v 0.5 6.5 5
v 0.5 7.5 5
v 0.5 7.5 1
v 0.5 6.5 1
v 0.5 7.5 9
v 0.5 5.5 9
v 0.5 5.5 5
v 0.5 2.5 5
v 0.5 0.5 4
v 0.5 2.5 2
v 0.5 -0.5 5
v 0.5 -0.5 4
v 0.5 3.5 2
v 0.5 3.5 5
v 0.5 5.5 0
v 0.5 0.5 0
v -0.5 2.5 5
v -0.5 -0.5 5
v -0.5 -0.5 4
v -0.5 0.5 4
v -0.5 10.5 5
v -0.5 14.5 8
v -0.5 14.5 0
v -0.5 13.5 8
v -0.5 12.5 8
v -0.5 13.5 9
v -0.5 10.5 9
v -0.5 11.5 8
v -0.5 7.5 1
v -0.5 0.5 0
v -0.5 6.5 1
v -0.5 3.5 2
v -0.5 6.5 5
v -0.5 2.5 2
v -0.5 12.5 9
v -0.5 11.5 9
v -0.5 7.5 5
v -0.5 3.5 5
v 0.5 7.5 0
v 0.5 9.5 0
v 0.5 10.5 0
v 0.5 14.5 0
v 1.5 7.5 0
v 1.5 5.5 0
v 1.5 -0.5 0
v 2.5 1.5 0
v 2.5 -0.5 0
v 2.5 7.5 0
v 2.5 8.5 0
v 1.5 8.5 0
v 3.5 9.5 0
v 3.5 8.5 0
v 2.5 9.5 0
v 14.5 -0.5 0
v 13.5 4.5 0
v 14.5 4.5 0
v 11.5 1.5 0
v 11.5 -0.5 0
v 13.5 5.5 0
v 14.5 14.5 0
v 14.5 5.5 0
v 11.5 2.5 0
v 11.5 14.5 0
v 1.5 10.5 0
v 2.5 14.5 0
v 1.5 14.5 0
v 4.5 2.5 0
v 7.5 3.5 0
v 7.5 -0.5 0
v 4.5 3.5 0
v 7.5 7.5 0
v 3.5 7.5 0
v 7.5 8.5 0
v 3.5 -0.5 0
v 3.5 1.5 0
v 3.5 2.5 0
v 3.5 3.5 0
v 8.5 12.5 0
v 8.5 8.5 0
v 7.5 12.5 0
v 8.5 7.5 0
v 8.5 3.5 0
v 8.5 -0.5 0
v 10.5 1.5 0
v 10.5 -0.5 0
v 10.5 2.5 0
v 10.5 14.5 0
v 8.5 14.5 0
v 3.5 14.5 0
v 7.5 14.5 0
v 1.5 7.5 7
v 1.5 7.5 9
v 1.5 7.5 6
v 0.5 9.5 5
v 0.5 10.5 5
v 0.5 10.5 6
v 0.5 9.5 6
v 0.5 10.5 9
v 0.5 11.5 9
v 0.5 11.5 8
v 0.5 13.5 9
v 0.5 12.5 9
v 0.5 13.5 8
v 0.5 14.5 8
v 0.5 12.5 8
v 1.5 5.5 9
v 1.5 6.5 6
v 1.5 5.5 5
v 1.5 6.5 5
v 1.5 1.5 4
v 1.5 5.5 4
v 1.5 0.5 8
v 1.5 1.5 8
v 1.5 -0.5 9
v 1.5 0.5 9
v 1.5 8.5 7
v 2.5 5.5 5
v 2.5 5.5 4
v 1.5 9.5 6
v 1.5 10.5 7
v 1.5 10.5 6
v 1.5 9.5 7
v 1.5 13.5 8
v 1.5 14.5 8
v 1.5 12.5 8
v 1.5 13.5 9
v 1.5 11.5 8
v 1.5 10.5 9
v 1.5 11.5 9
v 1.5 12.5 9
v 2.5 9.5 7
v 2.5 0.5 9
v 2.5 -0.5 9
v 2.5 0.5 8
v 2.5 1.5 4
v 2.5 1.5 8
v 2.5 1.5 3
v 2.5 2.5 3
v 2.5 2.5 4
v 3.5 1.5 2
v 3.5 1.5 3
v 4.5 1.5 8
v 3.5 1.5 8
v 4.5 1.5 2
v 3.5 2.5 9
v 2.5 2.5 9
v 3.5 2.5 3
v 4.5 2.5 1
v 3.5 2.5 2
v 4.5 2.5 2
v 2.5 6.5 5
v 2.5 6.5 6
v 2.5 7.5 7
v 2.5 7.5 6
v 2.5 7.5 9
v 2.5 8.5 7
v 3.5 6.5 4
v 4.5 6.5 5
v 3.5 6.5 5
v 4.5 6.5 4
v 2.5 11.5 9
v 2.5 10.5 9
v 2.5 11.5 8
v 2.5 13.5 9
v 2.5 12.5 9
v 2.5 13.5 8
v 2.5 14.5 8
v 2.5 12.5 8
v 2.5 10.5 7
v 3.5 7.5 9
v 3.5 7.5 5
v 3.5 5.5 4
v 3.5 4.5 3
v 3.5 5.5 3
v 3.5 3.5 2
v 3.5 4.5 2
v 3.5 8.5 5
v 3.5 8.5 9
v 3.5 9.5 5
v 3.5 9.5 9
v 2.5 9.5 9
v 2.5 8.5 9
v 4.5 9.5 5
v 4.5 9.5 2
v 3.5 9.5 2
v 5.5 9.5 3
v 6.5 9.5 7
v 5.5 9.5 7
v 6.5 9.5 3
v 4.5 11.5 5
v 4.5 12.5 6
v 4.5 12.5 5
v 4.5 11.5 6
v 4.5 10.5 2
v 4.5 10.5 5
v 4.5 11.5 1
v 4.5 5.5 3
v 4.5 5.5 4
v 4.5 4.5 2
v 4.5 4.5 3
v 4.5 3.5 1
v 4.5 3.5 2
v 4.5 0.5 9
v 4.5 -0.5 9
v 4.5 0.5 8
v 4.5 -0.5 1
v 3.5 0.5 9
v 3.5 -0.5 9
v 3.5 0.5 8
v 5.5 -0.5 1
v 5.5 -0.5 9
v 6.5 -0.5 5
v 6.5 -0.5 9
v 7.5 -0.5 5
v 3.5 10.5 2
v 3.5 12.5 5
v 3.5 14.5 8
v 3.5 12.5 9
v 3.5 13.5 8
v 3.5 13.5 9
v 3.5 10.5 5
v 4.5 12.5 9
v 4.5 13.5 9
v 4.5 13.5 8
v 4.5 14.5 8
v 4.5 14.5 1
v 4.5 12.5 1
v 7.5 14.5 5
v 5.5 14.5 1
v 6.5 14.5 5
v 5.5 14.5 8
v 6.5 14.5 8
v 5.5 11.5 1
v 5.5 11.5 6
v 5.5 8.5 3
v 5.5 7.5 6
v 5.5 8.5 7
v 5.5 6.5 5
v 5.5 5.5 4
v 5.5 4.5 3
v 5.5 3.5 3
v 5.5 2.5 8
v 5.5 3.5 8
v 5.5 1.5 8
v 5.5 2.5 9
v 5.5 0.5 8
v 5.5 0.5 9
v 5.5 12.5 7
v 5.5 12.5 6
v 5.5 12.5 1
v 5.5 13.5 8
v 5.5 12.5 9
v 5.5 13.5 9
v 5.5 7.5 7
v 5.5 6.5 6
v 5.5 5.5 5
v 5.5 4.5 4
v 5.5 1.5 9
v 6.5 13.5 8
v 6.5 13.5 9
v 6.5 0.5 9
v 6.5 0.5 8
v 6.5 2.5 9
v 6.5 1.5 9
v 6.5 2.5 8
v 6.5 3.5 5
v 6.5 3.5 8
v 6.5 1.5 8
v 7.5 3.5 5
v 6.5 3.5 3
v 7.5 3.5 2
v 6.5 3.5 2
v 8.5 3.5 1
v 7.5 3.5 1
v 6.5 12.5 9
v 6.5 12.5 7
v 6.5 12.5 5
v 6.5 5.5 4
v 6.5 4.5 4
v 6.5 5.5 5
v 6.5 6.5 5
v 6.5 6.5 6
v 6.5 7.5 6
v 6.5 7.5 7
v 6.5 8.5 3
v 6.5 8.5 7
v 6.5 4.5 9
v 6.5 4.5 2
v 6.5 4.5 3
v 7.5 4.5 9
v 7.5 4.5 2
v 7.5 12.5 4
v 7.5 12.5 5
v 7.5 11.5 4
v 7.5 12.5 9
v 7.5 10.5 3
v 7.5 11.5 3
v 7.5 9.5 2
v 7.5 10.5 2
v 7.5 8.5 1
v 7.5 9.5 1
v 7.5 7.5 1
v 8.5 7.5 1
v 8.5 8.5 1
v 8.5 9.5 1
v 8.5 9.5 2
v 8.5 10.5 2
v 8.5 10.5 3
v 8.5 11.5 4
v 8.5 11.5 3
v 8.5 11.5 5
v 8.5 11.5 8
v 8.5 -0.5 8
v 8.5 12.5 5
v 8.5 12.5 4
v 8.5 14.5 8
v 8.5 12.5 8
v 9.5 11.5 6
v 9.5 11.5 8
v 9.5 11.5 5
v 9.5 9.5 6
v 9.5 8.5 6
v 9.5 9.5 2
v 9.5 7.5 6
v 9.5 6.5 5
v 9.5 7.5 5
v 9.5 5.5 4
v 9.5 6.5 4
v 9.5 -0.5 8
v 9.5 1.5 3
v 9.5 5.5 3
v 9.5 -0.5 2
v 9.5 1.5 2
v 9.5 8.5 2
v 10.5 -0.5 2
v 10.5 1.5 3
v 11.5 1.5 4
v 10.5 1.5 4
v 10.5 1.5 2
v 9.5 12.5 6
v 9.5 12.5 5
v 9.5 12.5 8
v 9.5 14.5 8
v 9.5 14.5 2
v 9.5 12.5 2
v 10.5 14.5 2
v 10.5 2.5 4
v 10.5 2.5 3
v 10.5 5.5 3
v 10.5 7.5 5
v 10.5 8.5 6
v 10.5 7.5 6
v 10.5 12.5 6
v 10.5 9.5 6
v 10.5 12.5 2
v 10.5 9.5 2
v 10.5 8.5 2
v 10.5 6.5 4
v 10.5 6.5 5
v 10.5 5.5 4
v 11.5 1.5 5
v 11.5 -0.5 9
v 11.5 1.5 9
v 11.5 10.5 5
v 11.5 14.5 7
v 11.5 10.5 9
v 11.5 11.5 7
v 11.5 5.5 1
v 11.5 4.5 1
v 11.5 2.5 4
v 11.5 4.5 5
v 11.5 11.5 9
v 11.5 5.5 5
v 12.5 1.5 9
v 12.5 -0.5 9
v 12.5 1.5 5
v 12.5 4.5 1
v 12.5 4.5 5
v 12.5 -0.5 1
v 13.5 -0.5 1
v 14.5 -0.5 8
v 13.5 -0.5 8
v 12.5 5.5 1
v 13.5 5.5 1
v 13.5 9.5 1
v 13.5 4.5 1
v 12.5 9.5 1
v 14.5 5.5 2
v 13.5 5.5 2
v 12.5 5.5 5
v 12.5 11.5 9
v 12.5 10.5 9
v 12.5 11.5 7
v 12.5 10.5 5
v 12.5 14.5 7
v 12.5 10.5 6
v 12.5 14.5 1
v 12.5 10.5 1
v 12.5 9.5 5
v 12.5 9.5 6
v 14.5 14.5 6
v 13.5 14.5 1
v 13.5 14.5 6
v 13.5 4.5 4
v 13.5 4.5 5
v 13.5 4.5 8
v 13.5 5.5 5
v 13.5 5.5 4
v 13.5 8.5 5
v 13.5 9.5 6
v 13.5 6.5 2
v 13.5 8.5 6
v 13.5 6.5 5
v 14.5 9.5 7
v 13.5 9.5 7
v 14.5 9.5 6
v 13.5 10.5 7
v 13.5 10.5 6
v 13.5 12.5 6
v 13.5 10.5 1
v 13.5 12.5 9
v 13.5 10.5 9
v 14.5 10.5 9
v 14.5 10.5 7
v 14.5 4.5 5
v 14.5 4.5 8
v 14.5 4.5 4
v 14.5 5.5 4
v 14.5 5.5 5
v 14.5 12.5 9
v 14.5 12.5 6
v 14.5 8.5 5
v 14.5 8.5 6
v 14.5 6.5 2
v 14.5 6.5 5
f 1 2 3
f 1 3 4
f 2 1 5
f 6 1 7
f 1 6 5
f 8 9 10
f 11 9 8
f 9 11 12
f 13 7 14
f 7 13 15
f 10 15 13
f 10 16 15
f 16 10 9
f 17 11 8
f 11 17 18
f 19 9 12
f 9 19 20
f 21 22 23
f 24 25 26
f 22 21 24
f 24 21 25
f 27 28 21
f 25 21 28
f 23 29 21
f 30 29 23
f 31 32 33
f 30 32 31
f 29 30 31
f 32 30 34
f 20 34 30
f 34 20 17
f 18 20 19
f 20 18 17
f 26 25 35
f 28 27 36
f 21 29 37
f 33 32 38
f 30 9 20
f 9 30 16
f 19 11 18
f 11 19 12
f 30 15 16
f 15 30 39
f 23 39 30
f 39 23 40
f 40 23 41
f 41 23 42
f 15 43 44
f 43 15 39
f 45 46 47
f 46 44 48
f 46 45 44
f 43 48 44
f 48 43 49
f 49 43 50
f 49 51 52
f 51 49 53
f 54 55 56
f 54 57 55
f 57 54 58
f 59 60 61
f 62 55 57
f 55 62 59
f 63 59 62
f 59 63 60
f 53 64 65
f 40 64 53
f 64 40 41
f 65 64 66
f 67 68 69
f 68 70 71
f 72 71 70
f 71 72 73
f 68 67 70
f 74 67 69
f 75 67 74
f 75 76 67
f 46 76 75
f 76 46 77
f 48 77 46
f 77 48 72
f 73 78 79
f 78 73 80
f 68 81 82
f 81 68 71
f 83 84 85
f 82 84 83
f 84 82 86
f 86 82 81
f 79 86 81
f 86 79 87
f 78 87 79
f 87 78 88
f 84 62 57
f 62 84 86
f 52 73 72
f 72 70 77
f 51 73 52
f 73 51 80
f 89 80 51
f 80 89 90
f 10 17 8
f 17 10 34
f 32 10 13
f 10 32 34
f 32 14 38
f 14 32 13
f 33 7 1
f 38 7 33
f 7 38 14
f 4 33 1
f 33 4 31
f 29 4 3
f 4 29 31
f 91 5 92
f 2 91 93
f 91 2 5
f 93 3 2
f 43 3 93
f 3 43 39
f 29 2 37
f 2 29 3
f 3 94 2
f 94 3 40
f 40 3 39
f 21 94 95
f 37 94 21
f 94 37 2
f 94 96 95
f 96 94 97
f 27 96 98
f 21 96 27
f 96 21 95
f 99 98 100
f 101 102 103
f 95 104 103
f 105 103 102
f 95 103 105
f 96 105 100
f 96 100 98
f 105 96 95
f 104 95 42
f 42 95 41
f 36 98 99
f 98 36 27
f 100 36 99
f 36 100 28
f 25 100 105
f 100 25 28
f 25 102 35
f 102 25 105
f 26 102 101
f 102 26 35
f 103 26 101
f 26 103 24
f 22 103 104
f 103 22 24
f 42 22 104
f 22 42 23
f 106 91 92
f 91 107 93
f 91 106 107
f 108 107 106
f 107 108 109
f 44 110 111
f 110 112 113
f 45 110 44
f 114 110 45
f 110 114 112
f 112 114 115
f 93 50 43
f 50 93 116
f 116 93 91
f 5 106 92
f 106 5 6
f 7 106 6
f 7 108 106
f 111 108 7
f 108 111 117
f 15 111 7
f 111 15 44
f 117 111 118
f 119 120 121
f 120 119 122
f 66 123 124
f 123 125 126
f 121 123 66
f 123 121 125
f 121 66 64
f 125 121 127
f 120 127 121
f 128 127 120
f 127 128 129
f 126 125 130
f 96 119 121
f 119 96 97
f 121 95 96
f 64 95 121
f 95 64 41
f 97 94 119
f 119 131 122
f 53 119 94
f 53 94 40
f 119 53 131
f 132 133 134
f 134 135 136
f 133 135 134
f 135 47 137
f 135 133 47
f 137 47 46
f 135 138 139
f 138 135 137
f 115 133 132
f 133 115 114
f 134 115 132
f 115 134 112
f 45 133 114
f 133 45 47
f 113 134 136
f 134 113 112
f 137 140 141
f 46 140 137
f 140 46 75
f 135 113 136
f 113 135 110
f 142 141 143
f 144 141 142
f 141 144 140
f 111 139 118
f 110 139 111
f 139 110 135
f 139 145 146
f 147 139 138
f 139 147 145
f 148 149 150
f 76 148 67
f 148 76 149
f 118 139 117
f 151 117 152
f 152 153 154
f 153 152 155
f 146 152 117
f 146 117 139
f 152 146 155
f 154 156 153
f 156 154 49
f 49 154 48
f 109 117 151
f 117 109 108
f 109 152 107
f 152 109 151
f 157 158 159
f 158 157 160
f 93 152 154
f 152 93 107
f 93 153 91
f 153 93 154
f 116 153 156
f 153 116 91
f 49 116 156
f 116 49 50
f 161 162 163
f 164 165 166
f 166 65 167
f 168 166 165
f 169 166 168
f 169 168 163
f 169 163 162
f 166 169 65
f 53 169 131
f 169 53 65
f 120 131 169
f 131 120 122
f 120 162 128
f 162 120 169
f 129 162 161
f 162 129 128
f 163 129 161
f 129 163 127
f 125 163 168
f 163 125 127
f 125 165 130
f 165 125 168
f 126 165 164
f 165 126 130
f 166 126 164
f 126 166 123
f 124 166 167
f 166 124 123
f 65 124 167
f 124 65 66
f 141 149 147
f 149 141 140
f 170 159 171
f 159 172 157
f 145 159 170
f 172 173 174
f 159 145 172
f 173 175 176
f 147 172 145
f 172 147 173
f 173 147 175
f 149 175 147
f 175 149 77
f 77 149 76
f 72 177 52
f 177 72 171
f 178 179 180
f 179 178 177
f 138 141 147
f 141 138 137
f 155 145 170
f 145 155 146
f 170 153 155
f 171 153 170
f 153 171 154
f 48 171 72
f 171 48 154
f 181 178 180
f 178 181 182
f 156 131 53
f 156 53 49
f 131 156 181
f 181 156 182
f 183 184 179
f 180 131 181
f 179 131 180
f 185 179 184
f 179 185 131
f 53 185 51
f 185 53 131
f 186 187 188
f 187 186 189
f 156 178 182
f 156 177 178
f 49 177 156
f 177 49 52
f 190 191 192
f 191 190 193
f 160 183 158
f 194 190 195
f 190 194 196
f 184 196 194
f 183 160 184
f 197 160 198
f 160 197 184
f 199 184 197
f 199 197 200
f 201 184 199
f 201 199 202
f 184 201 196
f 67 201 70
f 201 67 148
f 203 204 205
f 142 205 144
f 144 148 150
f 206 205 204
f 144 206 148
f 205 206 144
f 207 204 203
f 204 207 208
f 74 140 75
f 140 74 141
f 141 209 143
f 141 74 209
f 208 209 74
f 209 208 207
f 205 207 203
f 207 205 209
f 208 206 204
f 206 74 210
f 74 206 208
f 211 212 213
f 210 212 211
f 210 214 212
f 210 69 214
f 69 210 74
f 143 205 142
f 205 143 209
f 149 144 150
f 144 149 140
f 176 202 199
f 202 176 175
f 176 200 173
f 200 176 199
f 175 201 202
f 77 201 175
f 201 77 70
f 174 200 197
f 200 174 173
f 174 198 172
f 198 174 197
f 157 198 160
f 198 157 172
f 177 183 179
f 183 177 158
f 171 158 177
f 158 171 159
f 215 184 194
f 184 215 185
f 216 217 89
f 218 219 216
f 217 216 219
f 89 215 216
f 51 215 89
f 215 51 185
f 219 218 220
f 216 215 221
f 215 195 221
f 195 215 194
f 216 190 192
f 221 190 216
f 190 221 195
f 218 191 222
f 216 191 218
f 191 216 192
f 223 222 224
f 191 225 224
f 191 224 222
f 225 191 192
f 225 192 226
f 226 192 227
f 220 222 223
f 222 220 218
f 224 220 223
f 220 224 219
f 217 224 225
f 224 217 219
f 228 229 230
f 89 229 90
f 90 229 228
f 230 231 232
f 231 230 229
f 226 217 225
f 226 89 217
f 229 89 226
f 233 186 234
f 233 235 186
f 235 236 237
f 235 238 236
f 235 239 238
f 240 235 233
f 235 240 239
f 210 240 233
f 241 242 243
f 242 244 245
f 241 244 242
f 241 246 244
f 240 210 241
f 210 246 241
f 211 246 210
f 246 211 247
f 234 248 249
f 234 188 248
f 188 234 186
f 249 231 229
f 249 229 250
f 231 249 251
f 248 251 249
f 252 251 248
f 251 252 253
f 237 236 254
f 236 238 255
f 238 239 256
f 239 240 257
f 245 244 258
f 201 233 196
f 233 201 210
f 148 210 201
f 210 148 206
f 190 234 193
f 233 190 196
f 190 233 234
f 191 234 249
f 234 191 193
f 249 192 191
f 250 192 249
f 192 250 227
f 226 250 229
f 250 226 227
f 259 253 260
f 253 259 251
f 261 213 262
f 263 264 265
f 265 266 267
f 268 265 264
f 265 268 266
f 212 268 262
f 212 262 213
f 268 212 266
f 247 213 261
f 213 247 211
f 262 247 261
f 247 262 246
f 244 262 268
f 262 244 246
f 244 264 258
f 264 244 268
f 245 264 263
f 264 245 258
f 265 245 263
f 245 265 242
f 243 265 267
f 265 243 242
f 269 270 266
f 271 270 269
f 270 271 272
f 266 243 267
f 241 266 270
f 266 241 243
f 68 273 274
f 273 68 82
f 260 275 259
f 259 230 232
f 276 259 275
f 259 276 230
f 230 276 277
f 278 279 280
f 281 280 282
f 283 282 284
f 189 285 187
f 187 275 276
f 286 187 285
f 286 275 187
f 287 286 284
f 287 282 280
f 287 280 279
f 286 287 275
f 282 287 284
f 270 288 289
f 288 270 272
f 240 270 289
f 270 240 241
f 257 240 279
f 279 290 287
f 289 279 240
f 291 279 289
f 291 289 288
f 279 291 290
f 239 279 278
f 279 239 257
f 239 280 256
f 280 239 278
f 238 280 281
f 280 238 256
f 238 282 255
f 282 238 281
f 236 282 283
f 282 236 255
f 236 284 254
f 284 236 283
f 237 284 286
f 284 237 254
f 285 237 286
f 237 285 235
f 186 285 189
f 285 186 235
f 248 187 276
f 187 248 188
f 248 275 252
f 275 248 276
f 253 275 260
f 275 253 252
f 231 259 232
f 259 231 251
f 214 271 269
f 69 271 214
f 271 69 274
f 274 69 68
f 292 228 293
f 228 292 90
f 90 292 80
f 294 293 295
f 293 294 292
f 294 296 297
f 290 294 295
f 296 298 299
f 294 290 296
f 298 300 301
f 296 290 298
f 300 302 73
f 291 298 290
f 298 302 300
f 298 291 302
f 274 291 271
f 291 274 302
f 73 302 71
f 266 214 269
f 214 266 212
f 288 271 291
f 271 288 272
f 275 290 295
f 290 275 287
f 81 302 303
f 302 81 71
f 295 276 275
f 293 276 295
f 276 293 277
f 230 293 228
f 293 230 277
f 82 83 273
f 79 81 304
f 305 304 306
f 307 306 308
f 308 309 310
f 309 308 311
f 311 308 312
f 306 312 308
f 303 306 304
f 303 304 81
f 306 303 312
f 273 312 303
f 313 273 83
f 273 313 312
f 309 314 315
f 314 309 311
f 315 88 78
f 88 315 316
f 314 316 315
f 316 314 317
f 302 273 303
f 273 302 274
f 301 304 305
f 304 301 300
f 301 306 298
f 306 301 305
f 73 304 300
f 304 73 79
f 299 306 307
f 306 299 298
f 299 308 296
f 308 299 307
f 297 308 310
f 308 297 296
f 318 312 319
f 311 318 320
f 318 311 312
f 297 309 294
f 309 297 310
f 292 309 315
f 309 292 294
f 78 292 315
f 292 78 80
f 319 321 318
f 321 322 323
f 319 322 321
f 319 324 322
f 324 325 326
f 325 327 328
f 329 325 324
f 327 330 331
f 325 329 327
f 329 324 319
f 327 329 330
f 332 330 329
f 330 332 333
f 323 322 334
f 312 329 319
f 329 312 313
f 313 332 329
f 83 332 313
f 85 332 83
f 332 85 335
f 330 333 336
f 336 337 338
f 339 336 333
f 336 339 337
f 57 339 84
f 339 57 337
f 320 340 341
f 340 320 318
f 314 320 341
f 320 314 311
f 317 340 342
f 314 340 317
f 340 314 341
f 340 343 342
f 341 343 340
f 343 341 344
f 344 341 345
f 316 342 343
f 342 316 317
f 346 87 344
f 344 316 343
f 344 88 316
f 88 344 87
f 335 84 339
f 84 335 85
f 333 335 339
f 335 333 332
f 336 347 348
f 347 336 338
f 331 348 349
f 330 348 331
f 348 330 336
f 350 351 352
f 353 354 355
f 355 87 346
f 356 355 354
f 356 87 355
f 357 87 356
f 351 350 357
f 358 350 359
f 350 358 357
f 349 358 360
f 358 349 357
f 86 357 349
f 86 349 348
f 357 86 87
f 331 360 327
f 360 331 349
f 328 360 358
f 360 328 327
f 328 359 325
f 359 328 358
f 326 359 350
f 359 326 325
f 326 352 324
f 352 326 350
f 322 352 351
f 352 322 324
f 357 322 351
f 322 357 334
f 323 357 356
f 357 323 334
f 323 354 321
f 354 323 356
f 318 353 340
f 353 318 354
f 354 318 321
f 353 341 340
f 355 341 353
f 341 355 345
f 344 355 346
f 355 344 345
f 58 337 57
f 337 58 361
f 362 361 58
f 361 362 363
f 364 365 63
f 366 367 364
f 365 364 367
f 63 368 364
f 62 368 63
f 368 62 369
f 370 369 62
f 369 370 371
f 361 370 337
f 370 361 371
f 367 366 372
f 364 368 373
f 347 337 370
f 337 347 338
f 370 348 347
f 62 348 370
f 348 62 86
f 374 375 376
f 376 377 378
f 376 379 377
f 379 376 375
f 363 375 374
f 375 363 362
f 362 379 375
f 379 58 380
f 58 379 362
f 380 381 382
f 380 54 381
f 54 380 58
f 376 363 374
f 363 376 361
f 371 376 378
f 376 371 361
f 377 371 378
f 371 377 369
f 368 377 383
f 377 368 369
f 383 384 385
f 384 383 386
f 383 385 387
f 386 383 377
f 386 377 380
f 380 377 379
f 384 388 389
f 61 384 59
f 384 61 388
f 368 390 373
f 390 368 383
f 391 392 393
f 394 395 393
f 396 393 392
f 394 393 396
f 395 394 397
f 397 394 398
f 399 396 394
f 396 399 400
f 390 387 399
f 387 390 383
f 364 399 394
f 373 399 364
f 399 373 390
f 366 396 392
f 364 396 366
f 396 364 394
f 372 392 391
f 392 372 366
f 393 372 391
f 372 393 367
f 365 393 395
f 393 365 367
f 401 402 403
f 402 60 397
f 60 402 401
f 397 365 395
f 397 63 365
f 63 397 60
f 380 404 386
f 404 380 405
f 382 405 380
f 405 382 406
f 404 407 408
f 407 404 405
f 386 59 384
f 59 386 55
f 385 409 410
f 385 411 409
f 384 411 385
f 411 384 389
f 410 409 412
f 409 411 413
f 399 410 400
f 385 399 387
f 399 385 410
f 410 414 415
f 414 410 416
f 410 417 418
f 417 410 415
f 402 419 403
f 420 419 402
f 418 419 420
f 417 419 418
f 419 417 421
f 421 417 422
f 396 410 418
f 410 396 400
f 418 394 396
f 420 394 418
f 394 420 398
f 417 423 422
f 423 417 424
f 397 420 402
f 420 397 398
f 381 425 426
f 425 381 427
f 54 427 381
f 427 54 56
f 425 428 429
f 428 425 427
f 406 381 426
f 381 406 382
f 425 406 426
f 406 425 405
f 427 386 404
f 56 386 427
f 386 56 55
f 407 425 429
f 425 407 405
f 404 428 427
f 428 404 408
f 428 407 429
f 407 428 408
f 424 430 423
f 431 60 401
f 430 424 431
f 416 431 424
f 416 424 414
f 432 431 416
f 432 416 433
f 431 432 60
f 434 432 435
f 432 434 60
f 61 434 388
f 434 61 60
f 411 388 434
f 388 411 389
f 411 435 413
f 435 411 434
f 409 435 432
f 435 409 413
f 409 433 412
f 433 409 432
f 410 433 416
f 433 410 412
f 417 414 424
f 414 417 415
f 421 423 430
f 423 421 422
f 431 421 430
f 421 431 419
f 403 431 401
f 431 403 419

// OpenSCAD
union() {
    translate([0, 0, 4.5]) color([1, 0, 0]) cube([1, 1, 1], center=true);
    translate([0, 1, 2.5]) cube([1, 1, 5], center=true);
    translate([0, 2, 2.5]) cube([1, 1, 5], center=true);
    translate([0, 3, 1.0]) cube([1, 1, 2], center=true);
    translate([0, 4, 2.5]) cube([1, 1, 5], center=true);
    translate([0, 5, 2.5]) cube([1, 1, 5], center=true);
    translate([0, 6, 2.5]) cube([1, 1, 5], center=true);
    translate([0, 7, 0.5]) cube([1, 1, 1], center=true);
    translate([0, 8, 2.5]) cube([1, 1, 5], center=true);
    translate([0, 9, 2.5]) cube([1, 1, 5], center=true);
    translate([0, 10, 2.5]) cube([1, 1, 5], center=true);
    translate([0, 11, 4.5]) cube([1, 1, 9], center=true);
    translate([0, 12, 4.0]) cube([1, 1, 8], center=true);
    translate([0, 13, 4.5]) cube([1, 1, 9], center=true);
    translate([0, 14, 4.0]) cube([1, 1, 8], center=true);
    translate([1, 6, 4.5]) cube([1, 1, 9], center=true);
    translate([1, 7, 4.5]) cube([1, 1, 9], center=true);
    translate([1, 10, 3.0]) cube([1, 1, 6], center=true);
    translate([2, 0, 4.5]) cube([1, 1, 9], center=true);
    translate([2, 1, 4.0]) cube([1, 1, 8], center=true);
    translate([2, 2, 2.0]) cube([1, 1, 4], center=true);
    translate([2, 3, 2.0]) cube([1, 1, 4], center=true);
    translate([2, 4, 2.0]) cube([1, 1, 4], center=true);
    translate([2, 5, 2.0]) cube([1, 1, 4], center=true);
    translate([2, 6, 2.5]) cube([1, 1, 5], center=true);
    translate([2, 7, 3.0]) cube([1, 1, 6], center=true);
    translate([2, 8, 3.5]) cube([1, 1, 7], center=true);
    translate([2, 10, 3.5]) cube([1, 1, 7], center=true);
    translate([2, 11, 4.5]) cube([1, 1, 9], center=true);
    translate([2, 12, 4.0]) cube([1, 1, 8], center=true);
    translate([2, 13, 4.5]) cube([1, 1, 9], center=true);
    translate([2, 14, 4.0]) cube([1, 1, 8], center=true);
    translate([3, 2, 1.5]) cube([1, 1, 3], center=true);
    translate([3, 3, 4.5]) cube([1, 1, 9], center=true);
    translate([3, 4, 4.5]) cube([1, 1, 9], center=true);
    translate([3, 5, 4.5]) cube([1, 1, 9], center=true);
    translate([3, 6, 4.5]) cube([1, 1, 9], center=true);
    translate([3, 7, 4.5]) cube([1, 1, 9], center=true);
    translate([3, 9, 4.5]) cube([1, 1, 9], center=true);
    translate([4, 0, 4.5]) cube([1, 1, 9], center=true);
    translate([4, 1, 4.0]) cube([1, 1, 8], center=true);
    translate([4, 2, 1.0]) cube([1, 1, 2], center=true);
    translate([4, 4, 1.0]) cube([1, 1, 2], center=true);
    translate([4, 5, 1.5]) cube([1, 1, 3], center=true);
    translate([4, 6, 2.0]) cube([1, 1, 4], center=true);
    translate([4, 7, 2.5]) cube([1, 1, 5], center=true);
    translate([4, 8, 2.5]) cube([1, 1, 5], center=true);
    translate([4, 9, 2.5]) cube([1, 1, 5], center=true);
    translate([4, 10, 1.0]) cube([1, 1, 2], center=true);
    translate([4, 11, 2.5]) cube([1, 1, 5], center=true);
    translate([4, 12, 2.5]) cube([1, 1, 5], center=true);
    translate([4, 13, 4.5]) cube([1, 1, 9], center=true);
    translate([4, 14, 4.0]) cube([1, 1, 8], center=true);
    translate([5, 0, 0.5]) cube([1, 1, 1], center=true);
    translate([5, 1, 0.5]) cube([1, 1, 1], center=true);
    translate([5, 2, 0.5]) cube([1, 1, 1], center=true);
    translate([5, 3, 0.5]) cube([1, 1, 1], center=true);
    translate([5, 4, 0.5]) cube([1, 1, 1], center=true);
    translate([5, 5, 0.5]) cube([1, 1, 1], center=true);
    translate([5, 6, 0.5]) cube([1, 1, 1], center=true);
    translate([5, 7, 0.5]) cube([1, 1, 1], center=true);
    translate([5, 8, 0.5]) cube([1, 1, 1], center=true);
    translate([5, 9, 0.5]) cube([1, 1, 1], center=true);
    translate([5, 10, 0.5]) cube([1, 1, 1], center=true);
    translate([5, 11, 0.5]) cube([1, 1, 1], center=true);
    translate([5, 12, 3.0]) cube([1, 1, 6], center=true);
    translate([5, 13, 0.5]) cube([1, 1, 1], center=true);
    translate([5, 14, 0.5]) cube([1, 1, 1], center=true);
    translate([6, 0, 4.5]) cube([1, 1, 9], center=true);
    translate([6, 1, 4.0]) cube([1, 1, 8], center=true);
    translate([6, 2, 4.5]) cube([1, 1, 9], center=true);
    translate([6, 3, 4.0]) cube([1, 1, 8], center=true);
    translate([6, 4, 1.5]) cube([1, 1, 3], center=true);
    translate([6, 5, 2.0]) cube([1, 1, 4], center=true);
    translate([6, 6, 2.5]) cube([1, 1, 5], center=true);
    translate([6, 7, 3.0]) cube([1, 1, 6], center=true);
    translate([6, 8, 3.5]) cube([1, 1, 7], center=true);
    translate([6, 9, 1.5]) cube([1, 1, 3], center=true);
    translate([6, 10, 3.5]) cube([1, 1, 7], center=true);
    translate([6, 11, 3.5]) cube([1, 1, 7], center=true);
    translate([6, 12, 3.5]) cube([1, 1, 7], center=true);
    translate([6, 13, 4.5]) cube([1, 1, 9], center=true);
    translate([6, 14, 4.0]) cube([1, 1, 8], center=true);
    translate([7, 0, 2.5]) cube([1, 1, 5], center=true);
    translate([7, 1, 2.5]) cube([1, 1, 5], center=true);
    translate([7, 2, 2.5]) cube([1, 1, 5], center=true);
    translate([7, 3, 2.5]) cube([1, 1, 5], center=true);
    translate([7, 4, 1.0]) cube([1, 1, 2], center=true);
    translate([7, 5, 4.5]) cube([1, 1, 9], center=true);
    translate([7, 6, 4.5]) cube([1, 1, 9], center=true);
    translate([7, 7, 4.5]) cube([1, 1, 9], center=true);
    translate([7, 8, 4.5]) cube([1, 1, 9], center=true);
    translate([7, 9, 4.5]) cube([1, 1, 9], center=true);
    translate([7, 10, 4.5]) cube([1, 1, 9], center=true);
    translate([7, 11, 4.5]) cube([1, 1, 9], center=true);
    translate([7, 12, 4.5]) cube([1, 1, 9], center=true);
    translate([7, 13, 2.5]) cube([1, 1, 5], center=true);
    translate([7, 14, 2.5]) cube([1, 1, 5], center=true);
    translate([8, 4, 0.5]) cube([1, 1, 1], center=true);
    translate([8, 5, 0.5]) cube([1, 1, 1], center=true);
    translate([8, 6, 0.5]) cube([1, 1, 1], center=true);
    translate([8, 7, 0.5]) cube([1, 1, 1], center=true);
    translate([8, 9, 0.5]) cube([1, 1, 1], center=true);
    translate([8, 10, 1.0]) cube([1, 1, 2], center=true);
    translate([8, 11, 1.5]) cube([1, 1, 3], center=true);
    translate([8, 12, 2.0]) cube([1, 1, 4], center=true);
    translate([9, 0, 4.0]) cube([1, 1, 8], center=true);
    translate([9, 1, 4.0]) cube([1, 1, 8], center=true);
    translate([9, 2, 4.0]) cube([1, 1, 8], center=true);
    translate([9, 3, 4.0]) cube([1, 1, 8], center=true);
    translate([9, 4, 4.0]) cube([1, 1, 8], center=true);
    translate([9, 5, 4.0]) cube([1, 1, 8], center=true);
    translate([9, 6, 4.0]) cube([1, 1, 8], center=true);
    translate([9, 7, 4.0]) cube([1, 1, 8], center=true);
    translate([9, 8, 4.0]) cube([1, 1, 8], center=true);
    translate([9, 9, 4.0]) cube([1, 1, 8], center=true);
    translate([9, 10, 4.0]) cube([1, 1, 8], center=true);
    translate([9, 11, 4.0]) cube([1, 1, 8], center=true);
    translate([9, 12, 2.5]) cube([1, 1, 5], center=true);
    translate([9, 13, 4.0]) cube([1, 1, 8], center=true);
    translate([9, 14, 4.0]) cube([1, 1, 8], center=true);
    translate([10, 0, 1.0]) cube([1, 1, 2], center=true);
    translate([10, 1, 1.0]) cube([1, 1, 2], center=true);
    translate([10, 2, 1.5]) cube([1, 1, 3], center=true);
    translate([10, 3, 1.5]) cube([1, 1, 3], center=true);
    translate([10, 4, 1.5]) cube([1, 1, 3], center=true);
    translate([10, 5, 1.5]) cube([1, 1, 3], center=true);
    translate([10, 6, 2.0]) cube([1, 1, 4], center=true);
    translate([10, 7, 2.5]) cube([1, 1, 5], center=true);
    translate([10, 8, 3.0]) cube([1, 1, 6], center=true);
    translate([10, 9, 1.0]) cube([1, 1, 2], center=true);
    translate([10, 10, 3.0]) cube([1, 1, 6], center=true);
    translate([10, 11, 3.0]) cube([1, 1, 6], center=true);
    translate([10, 12, 3.0]) cube([1, 1, 6], center=true);
    translate([10, 13, 1.0]) cube([1, 1, 2], center=true);
    translate([10, 14, 1.0]) cube([1, 1, 2], center=true);
    translate([11, 2, 2.0]) cube([1, 1, 4], center=true);
    translate([12, 0, 4.5]) cube([1, 1, 9], center=true);
    translate([12, 1, 4.5]) cube([1, 1, 9], center=true);
    translate([12, 2, 2.5]) cube([1, 1, 5], center=true);
    translate([12, 3, 2.5]) cube([1, 1, 5], center=true);
    translate([12, 4, 2.5]) cube([1, 1, 5], center=true);
    translate([12, 5, 0.5]) cube([1, 1, 1], center=true);
    translate([12, 6, 2.5]) cube([1, 1, 5], center=true);
    translate([12, 7, 2.5]) cube([1, 1, 5], center=true);
    translate([12, 8, 2.5]) cube([1, 1, 5], center=true);
    translate([12, 9, 2.5]) cube([1, 1, 5], center=true);
    translate([12, 10, 2.5]) cube([1, 1, 5], center=true);
    translate([12, 11, 4.5]) cube([1, 1, 9], center=true);
    translate([12, 12, 3.5]) cube([1, 1, 7], center=true);
    translate([12, 13, 3.5]) cube([1, 1, 7], center=true);
    translate([12, 14, 3.5]) cube([1, 1, 7], center=true);
    translate([13, 0, 0.5]) cube([1, 1, 1], center=true);
    translate([13, 1, 0.5]) cube([1, 1, 1], center=true);
    translate([13, 2, 0.5]) cube([1, 1, 1], center=true);
    translate([13, 3, 0.5]) cube([1, 1, 1], center=true);
    translate([13, 4, 0.5]) cube([1, 1, 1], center=true);
    translate([13, 5, 0.5]) cube([1, 1, 1], center=true);
    translate([13, 6, 0.5]) cube([1, 1, 1], center=true);
    translate([13, 7, 0.5]) cube([1, 1, 1], center=true);
    translate([13, 8, 0.5]) cube([1, 1, 1], center=true);
    translate([13, 9, 0.5]) cube([1, 1, 1], center=true);
    translate([13, 10, 3.0]) cube([1, 1, 6], center=true);
    translate([13, 11, 0.5]) cube([1, 1, 1], center=true);
    translate([13, 12, 0.5]) cube([1, 1, 1], center=true);
    translate([13, 13, 0.5]) cube([1, 1, 1], center=true);
    translate([13, 14, 0.5]) cube([1, 1, 1], center=true);
    translate([14, 0, 4.0]) cube([1, 1, 8], center=true);
    translate([14, 1, 4.0]) cube([1, 1, 8], center=true);
    translate([14, 2, 4.0]) cube([1, 1, 8], center=true);
    translate([14, 3, 4.0]) cube([1, 1, 8], center=true);
    translate([14, 4, 4.0]) cube([1, 1, 8], center=true);
    translate([14, 5, 4.5]) color([0, 0, 1]) cube([1, 1, 1], center=true);
    translate([14, 6, 1.0]) cube([1, 1, 2], center=true);
    translate([14, 7, 2.5]) cube([1, 1, 5], center=true);
    translate([14, 8, 2.5]) cube([1, 1, 5], center=true);
    translate([14, 9, 3.0]) cube([1, 1, 6], center=true);
    translate([14, 10, 3.5]) cube([1, 1, 7], center=true);
    translate([14, 11, 4.5]) cube([1, 1, 9], center=true);
    translate([14, 12, 4.5]) cube([1, 1, 9], center=true);
    translate([14, 13, 3.0]) cube([1, 1, 6], center=true);
    translate([14, 14, 3.0]) cube([1, 1, 6], center=true);
}
